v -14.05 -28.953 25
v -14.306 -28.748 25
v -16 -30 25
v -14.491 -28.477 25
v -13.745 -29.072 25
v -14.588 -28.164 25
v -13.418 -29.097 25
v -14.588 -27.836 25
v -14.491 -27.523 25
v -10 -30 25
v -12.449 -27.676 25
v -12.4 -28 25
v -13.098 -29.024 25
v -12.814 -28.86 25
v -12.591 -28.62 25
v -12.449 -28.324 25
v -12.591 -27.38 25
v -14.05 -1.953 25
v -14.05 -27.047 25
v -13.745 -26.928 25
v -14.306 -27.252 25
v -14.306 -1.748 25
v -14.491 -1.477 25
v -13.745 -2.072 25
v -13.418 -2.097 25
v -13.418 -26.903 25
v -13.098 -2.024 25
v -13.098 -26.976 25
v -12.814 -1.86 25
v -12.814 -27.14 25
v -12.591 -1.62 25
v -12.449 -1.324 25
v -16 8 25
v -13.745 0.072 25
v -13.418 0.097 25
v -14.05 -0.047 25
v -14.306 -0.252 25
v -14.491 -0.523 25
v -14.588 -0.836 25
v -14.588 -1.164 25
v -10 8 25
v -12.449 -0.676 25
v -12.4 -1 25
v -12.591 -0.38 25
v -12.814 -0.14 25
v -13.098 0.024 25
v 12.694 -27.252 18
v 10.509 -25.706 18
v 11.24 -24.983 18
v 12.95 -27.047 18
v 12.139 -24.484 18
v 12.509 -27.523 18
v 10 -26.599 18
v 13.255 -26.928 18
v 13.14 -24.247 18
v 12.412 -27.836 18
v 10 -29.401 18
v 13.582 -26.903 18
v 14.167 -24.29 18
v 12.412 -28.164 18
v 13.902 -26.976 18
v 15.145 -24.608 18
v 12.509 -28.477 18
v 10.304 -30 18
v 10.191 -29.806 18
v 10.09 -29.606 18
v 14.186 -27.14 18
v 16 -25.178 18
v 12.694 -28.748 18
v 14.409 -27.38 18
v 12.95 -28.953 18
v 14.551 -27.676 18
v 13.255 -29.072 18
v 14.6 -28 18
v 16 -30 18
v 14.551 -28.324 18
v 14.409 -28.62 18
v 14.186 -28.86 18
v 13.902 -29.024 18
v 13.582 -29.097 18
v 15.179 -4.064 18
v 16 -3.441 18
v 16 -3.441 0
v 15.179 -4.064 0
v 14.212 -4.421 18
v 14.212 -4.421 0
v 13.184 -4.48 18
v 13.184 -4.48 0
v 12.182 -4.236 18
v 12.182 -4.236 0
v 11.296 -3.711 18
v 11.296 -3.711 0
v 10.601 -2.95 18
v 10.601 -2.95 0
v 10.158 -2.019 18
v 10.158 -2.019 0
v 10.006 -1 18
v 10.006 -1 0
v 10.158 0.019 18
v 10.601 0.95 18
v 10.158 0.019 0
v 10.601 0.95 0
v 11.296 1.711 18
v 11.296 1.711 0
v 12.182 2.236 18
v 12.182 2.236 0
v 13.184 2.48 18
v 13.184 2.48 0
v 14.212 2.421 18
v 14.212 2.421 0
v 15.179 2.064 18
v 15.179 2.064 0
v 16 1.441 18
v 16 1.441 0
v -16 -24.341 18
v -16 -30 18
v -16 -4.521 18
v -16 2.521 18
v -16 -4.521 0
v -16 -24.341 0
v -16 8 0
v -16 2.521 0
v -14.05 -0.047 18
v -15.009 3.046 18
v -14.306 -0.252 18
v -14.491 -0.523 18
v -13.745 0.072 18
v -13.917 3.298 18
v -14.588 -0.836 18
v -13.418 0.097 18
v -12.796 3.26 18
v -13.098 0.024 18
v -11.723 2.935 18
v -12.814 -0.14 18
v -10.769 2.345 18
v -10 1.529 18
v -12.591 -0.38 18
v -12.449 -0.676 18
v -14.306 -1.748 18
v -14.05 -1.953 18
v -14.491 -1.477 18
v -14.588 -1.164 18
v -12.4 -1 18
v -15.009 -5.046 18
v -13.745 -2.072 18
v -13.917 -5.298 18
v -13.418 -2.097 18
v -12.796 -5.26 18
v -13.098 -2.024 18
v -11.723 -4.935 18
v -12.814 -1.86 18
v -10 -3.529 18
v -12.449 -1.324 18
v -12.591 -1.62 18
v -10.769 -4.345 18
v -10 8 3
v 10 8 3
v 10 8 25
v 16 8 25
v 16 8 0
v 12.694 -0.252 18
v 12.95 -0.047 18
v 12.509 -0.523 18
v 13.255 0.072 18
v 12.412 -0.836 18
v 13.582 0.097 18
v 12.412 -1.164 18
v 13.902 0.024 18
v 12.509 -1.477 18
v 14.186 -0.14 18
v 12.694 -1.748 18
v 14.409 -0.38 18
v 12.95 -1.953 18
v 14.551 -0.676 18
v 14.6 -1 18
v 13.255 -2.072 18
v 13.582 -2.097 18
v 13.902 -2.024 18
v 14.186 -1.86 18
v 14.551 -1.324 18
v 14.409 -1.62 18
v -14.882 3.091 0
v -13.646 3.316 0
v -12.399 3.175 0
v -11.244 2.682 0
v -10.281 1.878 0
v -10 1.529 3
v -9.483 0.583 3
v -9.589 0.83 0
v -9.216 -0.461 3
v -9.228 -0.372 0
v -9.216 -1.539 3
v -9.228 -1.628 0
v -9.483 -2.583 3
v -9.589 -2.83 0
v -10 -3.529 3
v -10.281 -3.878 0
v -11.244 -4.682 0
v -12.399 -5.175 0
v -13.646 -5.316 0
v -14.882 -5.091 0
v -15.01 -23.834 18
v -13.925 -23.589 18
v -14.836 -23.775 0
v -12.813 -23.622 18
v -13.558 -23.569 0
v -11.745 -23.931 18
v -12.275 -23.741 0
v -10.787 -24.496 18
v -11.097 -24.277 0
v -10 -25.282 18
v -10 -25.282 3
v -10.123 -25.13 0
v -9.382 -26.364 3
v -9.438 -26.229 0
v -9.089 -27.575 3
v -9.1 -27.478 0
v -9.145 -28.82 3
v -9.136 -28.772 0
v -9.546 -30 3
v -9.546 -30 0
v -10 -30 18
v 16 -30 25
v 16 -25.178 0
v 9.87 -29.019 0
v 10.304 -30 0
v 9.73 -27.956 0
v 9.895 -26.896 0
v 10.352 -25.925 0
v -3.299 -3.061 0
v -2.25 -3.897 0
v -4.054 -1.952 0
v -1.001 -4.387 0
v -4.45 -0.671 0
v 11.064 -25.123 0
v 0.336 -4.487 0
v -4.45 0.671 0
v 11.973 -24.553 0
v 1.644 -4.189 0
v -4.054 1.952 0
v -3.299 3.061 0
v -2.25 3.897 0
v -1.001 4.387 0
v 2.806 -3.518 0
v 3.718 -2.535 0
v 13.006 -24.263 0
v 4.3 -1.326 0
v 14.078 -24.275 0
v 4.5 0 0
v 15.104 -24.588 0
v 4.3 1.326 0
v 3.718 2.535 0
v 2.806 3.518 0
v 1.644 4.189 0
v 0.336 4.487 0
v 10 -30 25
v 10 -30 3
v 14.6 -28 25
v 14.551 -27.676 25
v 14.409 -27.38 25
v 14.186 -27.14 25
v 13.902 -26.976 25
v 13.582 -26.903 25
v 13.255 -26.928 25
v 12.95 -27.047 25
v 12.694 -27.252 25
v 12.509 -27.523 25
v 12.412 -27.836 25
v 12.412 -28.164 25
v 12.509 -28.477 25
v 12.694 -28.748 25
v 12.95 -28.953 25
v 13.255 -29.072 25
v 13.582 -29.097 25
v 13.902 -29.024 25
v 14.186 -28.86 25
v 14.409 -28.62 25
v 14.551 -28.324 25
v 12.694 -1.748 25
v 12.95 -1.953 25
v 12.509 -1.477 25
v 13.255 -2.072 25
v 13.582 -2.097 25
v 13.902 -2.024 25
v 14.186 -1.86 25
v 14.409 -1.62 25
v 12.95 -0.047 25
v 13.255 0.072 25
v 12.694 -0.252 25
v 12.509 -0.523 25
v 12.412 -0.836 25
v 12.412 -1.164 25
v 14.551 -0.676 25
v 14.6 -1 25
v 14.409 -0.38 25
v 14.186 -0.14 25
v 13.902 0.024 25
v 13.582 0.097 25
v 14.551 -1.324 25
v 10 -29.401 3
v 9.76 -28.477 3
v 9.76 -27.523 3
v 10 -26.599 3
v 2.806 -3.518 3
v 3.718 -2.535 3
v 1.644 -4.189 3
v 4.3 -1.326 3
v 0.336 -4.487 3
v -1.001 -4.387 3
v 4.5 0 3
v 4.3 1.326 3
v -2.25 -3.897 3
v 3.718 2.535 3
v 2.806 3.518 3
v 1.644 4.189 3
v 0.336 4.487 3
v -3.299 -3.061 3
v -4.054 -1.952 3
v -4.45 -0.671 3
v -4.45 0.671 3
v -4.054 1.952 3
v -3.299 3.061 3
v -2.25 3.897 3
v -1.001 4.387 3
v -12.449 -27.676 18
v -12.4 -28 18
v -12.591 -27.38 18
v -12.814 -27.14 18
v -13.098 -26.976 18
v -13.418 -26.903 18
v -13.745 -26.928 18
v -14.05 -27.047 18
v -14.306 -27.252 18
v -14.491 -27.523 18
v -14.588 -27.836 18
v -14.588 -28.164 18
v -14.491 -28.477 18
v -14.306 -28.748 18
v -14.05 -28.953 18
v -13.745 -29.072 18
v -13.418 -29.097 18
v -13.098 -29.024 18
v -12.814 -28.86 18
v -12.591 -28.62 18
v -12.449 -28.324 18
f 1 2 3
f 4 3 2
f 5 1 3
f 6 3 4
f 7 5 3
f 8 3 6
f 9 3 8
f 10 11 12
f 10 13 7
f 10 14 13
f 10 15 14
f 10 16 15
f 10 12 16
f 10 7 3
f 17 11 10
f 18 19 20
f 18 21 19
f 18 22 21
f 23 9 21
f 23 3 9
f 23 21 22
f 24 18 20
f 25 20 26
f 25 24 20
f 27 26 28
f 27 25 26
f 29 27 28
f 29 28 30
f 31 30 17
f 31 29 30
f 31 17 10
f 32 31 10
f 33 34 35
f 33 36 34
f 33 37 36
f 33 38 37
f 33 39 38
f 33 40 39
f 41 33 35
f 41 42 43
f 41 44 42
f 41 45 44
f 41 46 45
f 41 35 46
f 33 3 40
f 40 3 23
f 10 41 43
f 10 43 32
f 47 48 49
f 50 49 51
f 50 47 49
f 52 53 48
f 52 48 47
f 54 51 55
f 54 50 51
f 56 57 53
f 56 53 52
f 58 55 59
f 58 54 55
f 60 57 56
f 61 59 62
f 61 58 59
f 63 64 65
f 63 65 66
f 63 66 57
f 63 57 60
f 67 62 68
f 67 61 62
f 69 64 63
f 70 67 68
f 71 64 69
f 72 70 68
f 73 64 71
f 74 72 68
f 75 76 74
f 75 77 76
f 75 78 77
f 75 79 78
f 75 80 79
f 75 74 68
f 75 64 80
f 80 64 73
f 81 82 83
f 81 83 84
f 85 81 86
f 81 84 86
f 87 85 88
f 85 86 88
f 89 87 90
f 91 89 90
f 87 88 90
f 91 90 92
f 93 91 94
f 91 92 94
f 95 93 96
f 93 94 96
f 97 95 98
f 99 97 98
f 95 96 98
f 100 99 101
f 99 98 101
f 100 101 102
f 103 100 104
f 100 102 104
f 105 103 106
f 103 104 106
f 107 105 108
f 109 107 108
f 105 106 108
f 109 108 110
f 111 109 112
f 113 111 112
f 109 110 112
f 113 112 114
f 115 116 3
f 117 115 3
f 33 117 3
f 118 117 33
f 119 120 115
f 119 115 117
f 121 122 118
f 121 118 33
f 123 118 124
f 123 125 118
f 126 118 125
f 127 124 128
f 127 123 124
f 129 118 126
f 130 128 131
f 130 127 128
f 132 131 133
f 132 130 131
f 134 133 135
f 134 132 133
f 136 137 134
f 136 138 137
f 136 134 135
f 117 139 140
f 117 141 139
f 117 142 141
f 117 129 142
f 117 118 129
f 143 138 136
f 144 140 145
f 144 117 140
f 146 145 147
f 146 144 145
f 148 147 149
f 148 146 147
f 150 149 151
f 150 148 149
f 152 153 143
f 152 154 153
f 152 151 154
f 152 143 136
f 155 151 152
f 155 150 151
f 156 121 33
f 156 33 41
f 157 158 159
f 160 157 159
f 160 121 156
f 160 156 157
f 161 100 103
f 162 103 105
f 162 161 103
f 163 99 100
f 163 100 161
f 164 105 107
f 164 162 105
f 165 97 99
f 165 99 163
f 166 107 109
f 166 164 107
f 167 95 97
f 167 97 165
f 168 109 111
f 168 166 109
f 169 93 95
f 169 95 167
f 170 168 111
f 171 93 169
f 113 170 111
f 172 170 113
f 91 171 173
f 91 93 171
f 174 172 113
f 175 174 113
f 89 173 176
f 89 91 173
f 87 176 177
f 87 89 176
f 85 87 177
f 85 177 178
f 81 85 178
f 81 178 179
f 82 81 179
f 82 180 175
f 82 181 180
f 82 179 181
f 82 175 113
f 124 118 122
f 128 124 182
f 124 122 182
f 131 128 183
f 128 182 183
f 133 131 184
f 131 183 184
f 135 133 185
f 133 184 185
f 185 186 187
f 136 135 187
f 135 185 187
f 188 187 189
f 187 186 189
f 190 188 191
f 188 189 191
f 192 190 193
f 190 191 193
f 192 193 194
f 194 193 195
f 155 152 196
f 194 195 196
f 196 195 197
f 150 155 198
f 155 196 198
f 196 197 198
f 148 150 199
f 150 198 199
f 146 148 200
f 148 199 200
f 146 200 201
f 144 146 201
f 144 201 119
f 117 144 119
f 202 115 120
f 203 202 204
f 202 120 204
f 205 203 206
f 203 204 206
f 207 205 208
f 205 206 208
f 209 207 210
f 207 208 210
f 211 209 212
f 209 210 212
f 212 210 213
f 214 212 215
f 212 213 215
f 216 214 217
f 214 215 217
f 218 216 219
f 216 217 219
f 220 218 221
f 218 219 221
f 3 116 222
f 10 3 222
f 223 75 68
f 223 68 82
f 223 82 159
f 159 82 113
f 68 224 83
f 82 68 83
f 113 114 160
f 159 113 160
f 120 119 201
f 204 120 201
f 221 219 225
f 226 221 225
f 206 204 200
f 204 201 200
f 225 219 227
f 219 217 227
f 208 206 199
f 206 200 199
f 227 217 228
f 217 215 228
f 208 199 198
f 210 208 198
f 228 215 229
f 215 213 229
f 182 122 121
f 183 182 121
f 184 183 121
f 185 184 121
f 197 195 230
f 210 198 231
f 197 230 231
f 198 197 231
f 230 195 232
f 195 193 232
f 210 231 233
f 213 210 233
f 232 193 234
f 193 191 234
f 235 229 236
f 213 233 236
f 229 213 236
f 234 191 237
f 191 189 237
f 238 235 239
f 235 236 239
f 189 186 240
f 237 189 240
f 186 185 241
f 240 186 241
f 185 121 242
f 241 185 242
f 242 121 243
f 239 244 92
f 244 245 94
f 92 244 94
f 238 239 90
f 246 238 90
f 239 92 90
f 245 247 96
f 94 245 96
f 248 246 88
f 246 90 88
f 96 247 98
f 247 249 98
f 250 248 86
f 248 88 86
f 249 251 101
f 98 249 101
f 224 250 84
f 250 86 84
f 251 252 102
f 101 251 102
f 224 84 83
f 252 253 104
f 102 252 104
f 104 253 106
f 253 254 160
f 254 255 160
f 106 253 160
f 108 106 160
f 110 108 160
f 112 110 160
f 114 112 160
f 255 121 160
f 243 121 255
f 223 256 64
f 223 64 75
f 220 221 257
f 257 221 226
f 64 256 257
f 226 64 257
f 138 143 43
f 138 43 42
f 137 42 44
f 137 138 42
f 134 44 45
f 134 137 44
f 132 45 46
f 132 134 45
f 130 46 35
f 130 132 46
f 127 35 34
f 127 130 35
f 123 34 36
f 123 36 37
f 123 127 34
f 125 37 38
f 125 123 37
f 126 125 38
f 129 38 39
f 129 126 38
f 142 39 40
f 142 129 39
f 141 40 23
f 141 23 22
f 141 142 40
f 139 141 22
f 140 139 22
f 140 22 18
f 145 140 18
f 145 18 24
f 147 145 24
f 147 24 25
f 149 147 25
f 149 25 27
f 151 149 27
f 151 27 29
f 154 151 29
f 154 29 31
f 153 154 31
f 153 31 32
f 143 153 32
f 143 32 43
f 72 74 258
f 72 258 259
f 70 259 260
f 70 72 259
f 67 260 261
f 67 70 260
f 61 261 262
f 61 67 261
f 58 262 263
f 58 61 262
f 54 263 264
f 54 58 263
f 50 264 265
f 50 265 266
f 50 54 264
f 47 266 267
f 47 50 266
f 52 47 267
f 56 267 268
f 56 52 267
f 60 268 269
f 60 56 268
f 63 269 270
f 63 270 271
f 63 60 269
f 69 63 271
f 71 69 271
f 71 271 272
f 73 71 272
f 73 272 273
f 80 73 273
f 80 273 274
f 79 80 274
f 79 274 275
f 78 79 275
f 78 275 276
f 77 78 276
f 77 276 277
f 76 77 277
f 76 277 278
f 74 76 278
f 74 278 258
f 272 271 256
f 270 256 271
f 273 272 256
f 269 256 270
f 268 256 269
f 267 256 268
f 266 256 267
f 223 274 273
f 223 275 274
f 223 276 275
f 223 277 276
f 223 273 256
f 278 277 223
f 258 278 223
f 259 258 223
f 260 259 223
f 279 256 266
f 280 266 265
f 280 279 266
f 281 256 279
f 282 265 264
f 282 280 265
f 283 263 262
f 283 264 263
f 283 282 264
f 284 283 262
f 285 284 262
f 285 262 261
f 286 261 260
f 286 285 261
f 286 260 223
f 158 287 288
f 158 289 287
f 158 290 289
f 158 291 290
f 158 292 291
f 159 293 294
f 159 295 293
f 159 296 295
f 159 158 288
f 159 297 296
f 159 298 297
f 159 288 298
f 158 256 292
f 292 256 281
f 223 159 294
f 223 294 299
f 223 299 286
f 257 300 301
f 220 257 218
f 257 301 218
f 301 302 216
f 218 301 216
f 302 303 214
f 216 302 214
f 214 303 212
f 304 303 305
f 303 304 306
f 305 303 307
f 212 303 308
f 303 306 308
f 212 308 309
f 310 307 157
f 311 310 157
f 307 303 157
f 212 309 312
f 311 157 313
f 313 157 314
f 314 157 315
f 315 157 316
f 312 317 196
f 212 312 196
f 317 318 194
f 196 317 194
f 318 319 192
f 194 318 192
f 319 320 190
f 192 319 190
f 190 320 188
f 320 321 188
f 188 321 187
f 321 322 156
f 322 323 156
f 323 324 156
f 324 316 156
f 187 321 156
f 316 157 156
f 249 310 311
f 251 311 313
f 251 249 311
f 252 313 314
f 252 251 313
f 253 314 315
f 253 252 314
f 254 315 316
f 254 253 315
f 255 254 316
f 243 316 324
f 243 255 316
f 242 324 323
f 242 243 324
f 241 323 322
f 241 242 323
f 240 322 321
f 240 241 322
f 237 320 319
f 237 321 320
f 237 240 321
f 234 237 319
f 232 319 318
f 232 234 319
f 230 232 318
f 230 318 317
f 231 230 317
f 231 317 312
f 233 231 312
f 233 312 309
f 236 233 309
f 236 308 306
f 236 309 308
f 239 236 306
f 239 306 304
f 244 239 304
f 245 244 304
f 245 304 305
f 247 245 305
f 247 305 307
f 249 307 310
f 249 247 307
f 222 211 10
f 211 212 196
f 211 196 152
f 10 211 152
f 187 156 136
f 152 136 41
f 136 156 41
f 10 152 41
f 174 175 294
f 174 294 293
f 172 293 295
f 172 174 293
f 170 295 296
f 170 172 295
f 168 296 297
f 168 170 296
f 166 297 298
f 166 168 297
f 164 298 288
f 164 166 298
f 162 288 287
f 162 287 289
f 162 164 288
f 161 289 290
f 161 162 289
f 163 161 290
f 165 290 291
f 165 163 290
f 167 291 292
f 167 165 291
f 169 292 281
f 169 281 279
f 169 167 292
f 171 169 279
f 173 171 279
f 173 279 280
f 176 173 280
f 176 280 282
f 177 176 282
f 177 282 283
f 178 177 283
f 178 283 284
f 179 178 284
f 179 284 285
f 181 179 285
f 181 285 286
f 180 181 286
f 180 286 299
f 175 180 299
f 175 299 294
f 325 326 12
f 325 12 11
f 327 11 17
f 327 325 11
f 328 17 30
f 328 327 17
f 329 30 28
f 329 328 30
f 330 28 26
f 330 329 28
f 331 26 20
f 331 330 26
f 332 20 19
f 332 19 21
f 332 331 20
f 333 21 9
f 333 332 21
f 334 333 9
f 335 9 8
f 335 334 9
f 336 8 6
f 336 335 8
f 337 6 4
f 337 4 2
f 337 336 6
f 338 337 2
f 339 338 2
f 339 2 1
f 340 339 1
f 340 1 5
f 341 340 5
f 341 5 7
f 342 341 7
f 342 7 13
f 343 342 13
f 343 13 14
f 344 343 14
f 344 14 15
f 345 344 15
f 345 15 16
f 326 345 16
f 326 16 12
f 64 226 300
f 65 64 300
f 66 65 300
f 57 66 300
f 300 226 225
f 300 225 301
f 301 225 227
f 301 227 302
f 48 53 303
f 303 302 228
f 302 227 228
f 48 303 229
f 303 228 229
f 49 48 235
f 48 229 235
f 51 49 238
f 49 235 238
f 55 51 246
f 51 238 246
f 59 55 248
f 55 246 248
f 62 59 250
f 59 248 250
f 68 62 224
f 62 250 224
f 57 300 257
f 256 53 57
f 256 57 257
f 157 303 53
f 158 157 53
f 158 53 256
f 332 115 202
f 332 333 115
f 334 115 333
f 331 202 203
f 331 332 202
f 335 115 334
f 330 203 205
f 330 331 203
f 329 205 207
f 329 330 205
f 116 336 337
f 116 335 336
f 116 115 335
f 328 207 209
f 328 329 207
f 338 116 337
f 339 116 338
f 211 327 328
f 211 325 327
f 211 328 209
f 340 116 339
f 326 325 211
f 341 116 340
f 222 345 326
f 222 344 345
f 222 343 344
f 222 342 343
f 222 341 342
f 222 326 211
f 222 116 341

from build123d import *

# Parameters (mm, degrees)
F0_W     = 32
F0_H     = 38
F0_R     = 1.1
F0_R_2   = 4.5
F1_DEPTH = 25
F2_W     = 20
F2_H     = 22
F3_DEPTH = 38.001
F5_DEPTH = 18


with BuildPart() as f1:
    # F0 (on Top) → F1 (new body)
    with BuildSketch(Plane.XY):
        with Locations((0, -11)):
            Rectangle(F0_W, F0_H)
        with Locations((-13.5, -28)):
            Circle(F0_R, mode=Mode.SUBTRACT)
        with Locations((13.5, -28)):
            Circle(F0_R, mode=Mode.SUBTRACT)
        with Locations((-13.5, -1)):
            Circle(F0_R, mode=Mode.SUBTRACT)
        Circle(F0_R_2, mode=Mode.SUBTRACT)
        with Locations((13.5, -1)):
            Circle(F0_R, mode=Mode.SUBTRACT)
    extrude(amount=F1_DEPTH)

    # F2 (on face) → F3 (cut, through all)
    with BuildSketch(Plane(origin=(0, 8, 0), x_dir=(-1, 0, 0), z_dir=(0, 1, 0))):
        with Locations((0, 14)):
            Rectangle(F2_W, F2_H)
    extrude(amount=-F3_DEPTH, mode=Mode.SUBTRACT)

    # F4 (on face) → F5 (cut)
    with BuildSketch(Plane(origin=(0, 0, 0), x_dir=(1, 0, 0), z_dir=(0, 0, -1))):
        with BuildLine():
            Line((16, -1.44077), (16, 3.44077))
            ThreePointArc((16, 3.44077), (10.006097, 1), (16, -1.44077))
        make_face()
        with BuildLine():
            ThreePointArc((-16, -2.520859), (-9.181847, 1), (-16, 4.520859))
            Line((-16, 4.520859), (-16, -2.520859))
        make_face()
        with BuildLine():
            ThreePointArc((10.304378, 30), (11.064189, 25.122705), (16, 25.178298))
            Line((16, 25.178298), (16, 30))
            Line((16, 30), (10.304378, 30))
        make_face()
        with BuildLine():
            Line((-16, 30), (-16, 24.341244))
            ThreePointArc((-16, 24.341244), (-10.578677, 24.667979), (-9.545699, 30))
            Line((-9.545699, 30), (-16, 30))
        make_face()
    extrude(amount=-F5_DEPTH, mode=Mode.SUBTRACT)


solid = f1.part
